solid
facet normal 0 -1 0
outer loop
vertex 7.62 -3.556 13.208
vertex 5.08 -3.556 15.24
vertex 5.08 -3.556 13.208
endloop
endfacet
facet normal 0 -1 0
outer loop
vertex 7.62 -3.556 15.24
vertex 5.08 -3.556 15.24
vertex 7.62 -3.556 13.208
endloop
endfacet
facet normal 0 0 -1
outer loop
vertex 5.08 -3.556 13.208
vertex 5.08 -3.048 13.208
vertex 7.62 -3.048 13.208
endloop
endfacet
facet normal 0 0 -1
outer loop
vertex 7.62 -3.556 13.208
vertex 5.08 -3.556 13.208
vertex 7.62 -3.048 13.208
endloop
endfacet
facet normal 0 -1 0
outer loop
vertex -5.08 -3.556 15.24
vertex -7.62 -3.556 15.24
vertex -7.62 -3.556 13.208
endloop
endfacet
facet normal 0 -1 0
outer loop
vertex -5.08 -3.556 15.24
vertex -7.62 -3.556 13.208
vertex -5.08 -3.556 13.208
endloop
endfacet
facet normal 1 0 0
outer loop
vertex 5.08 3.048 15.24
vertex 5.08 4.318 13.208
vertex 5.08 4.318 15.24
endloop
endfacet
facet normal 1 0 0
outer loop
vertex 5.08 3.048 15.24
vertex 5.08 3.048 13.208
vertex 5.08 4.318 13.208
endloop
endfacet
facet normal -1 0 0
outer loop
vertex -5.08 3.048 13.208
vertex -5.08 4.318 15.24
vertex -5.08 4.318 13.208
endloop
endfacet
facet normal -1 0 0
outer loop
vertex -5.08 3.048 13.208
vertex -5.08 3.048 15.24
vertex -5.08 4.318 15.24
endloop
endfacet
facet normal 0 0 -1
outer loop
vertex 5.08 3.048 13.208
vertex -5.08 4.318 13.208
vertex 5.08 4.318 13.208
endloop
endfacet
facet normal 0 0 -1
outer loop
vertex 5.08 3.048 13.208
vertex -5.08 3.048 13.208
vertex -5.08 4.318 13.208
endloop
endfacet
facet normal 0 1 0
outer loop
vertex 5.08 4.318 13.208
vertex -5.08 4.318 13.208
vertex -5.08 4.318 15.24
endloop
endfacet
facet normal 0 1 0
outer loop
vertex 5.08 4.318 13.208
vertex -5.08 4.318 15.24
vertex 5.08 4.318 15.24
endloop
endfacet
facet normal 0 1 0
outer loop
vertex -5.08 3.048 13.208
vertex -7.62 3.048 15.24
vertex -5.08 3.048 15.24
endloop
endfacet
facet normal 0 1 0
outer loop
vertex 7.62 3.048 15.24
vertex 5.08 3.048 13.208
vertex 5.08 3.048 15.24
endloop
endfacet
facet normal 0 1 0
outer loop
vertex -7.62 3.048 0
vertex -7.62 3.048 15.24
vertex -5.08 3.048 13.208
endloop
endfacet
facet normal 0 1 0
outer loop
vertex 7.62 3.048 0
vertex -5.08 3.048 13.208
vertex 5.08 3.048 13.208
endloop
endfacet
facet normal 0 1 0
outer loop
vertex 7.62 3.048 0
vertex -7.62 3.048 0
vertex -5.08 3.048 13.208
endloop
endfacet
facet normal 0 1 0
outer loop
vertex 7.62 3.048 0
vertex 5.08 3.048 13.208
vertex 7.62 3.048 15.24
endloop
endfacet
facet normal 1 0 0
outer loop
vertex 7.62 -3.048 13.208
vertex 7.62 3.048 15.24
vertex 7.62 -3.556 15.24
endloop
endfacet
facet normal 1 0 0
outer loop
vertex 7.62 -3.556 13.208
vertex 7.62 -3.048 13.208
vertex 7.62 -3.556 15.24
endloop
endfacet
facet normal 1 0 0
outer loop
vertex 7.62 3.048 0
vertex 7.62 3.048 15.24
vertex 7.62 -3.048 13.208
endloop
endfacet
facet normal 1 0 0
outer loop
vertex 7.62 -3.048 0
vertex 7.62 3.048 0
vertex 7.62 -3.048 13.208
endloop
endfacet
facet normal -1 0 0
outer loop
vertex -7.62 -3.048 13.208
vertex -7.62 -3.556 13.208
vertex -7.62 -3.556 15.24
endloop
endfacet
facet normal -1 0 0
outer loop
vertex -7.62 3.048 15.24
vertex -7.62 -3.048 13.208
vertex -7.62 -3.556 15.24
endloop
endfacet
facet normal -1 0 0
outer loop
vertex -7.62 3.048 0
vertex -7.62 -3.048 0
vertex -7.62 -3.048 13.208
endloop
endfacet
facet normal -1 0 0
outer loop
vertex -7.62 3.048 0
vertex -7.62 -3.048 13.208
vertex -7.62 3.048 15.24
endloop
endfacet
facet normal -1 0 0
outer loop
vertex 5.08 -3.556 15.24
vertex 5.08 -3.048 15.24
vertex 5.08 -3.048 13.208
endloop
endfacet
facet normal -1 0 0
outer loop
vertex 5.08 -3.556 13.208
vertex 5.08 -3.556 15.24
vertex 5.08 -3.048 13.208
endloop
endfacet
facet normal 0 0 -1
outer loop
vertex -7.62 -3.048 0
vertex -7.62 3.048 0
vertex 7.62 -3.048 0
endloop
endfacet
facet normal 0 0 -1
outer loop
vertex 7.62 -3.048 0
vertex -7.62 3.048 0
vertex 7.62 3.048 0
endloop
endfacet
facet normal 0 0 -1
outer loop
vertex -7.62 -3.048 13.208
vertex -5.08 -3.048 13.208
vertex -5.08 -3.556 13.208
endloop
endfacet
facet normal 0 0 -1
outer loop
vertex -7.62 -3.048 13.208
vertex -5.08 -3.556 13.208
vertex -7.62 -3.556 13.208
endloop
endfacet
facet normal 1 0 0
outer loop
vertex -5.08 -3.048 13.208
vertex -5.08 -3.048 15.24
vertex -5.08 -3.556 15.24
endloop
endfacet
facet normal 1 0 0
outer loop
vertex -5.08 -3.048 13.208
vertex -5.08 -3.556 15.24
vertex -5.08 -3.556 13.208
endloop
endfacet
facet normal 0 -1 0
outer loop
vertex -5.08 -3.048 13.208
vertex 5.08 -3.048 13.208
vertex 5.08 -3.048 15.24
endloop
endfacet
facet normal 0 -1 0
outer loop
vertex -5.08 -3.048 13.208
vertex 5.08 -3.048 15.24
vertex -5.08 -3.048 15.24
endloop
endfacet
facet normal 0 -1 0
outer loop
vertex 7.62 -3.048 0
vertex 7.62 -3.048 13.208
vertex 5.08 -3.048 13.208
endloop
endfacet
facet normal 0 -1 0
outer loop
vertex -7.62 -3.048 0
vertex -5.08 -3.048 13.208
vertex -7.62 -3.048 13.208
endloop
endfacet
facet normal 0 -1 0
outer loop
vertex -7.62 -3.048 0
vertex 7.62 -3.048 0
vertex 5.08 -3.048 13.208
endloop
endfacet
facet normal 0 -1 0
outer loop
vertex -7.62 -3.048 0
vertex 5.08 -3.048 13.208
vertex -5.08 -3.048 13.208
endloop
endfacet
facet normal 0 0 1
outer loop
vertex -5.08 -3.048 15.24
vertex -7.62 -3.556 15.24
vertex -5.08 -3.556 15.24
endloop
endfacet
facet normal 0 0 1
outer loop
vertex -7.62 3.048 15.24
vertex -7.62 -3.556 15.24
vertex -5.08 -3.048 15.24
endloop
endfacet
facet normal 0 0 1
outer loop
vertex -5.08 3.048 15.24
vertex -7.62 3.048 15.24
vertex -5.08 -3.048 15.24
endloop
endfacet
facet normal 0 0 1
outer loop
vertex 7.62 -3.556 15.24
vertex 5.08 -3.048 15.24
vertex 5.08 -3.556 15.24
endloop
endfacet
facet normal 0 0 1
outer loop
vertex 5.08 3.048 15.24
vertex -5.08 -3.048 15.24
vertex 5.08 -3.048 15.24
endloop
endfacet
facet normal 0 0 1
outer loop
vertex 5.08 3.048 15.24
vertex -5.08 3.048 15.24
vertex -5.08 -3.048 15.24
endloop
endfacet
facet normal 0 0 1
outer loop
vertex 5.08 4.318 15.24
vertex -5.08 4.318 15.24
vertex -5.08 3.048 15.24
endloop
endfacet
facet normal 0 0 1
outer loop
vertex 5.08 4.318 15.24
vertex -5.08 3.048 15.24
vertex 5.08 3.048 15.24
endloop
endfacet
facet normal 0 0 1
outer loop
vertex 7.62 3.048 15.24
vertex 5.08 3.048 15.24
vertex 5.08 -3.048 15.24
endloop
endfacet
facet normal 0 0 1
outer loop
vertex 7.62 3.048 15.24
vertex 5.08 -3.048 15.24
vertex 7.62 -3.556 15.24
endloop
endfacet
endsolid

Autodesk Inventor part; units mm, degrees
ref_plane "YZ Plane" through (0, 0, 0) normal (1, 0, 0) x (0, 1, 0)
ref_plane "XZ Plane" through (0, 0, 0) normal (0, 1, 0) x (-1, 0, 0)
sketch "Sketch1" plane through (0, 0, 0) normal (0, 0, 1) x (1, 0, 0)
  line L0 (-7.62, 3.048) -> (7.62, 3.048)
  line L1 (7.62, 3.048) -> (7.62, -3.048)
  line L2 (7.62, -3.048) -> (-7.62, -3.048)
  line L3 (-7.62, -3.048) -> (-7.62, 3.048)
  point P0 (0, 0)
  point P1 (0, -3.048)
  point P2 (-7.62, 0)
  dimension "d0" = 15.24
  dimension "d1" = 6.096
extrude "Extrusion1" add sketch "Sketch1" along normal blind 15.24
sketch "Sketch2" plane through (-7.62, 3.048, 0) normal (0, 1, 0) x (1, 0, 0)
  line L0 (0, -15.24) -> (15.24, -15.24) projected
  line L1 (2.54, -13.208) -> (12.7, -13.208)
  line L2 (12.7, -13.208) -> (12.7, -15.24)
  line L3 (12.7, -15.24) -> (2.54, -15.24)
  line L4 (2.54, -15.24) -> (2.54, -13.208)
  point P0 (7.62, -15.24)
  dimension "d4" = 10.16
  dimension "d5" = 2.032
extrude "Extrusion2" add sketch "Sketch2" along normal blind 1.27
sketch "Sketch3" plane through (-7.62, -3.048, 0) normal (0, -1, 0) x (1, 0, 0)
  line L0 (0, 15.24) -> (2.54, 15.24)
  line L1 (2.54, 15.24) -> (2.54, 13.208)
  line L2 (2.54, 13.208) -> (0, 13.208)
  line L3 (0, 13.208) -> (0, 15.24)
  line L4 (15.24, 15.24) -> (12.7, 15.24)
  line L5 (12.7, 15.24) -> (12.7, 13.208)
  line L6 (12.7, 13.208) -> (15.24, 13.208)
  line L7 (15.24, 13.208) -> (15.24, 15.24)
  dimension "d8" = 2.54
  dimension "d9" = 2.54
  dimension "d10" = 2.032
  dimension "d11" = 2.032
extrude "Extrusion3" add sketch "Sketch3" along normal blind 0.508
sketch "Sketch4" plane through (0, 0, 0) normal (0, 0, -1) x (-1, 0, 0)
  line L0 (7.62, 3.048) -> (-7.62, 3.048) projected
  line L1 (-7.62, 3.048) -> (-7.62, -3.048) projected
  line L2 (-7.62, -3.048) -> (7.62, -3.048) projected
  line L3 (7.62, -3.048) -> (7.62, 3.048) projected
  point P0 (-6.35, 1.27)
  point P1 (-3.81, 1.27)
  point P2 (3.81, 1.27)
  point P3 (6.35, 1.27)
  point P4 (-6.35, -1.27)
  point P5 (-3.81, -1.27)
  point P6 (3.81, -1.27)
  point P7 (6.35, -1.27)
  point P8 (0, 3.048)
  point P9 (-1.27, 1.27)
  point P10 (-1.27, -1.27)
  point P11 (1.27, 1.27)
  point P12 (1.27, -1.27)
  dimension "d14" = 1.27
  dimension "d15" = 1.778
  dimension "d16" = 1.27
  dimension "d17" = 1.778
  dimension "d18" = 2.54
  dimension "d19" = 2.54
  dimension "d20" = 2.54
  dimension "d21" = 2.54
ref_plane "Work Plane1" through (0, 0, -9.525) normal (0, 0, -1) x (-1, 0, 0)
sketch "Sketch5" plane through (0, 0, -9.525) normal (0, 0, -1) x (-1, 0, 0)
  point P0 (0, 0)
properties part number "12 Pin DR"
